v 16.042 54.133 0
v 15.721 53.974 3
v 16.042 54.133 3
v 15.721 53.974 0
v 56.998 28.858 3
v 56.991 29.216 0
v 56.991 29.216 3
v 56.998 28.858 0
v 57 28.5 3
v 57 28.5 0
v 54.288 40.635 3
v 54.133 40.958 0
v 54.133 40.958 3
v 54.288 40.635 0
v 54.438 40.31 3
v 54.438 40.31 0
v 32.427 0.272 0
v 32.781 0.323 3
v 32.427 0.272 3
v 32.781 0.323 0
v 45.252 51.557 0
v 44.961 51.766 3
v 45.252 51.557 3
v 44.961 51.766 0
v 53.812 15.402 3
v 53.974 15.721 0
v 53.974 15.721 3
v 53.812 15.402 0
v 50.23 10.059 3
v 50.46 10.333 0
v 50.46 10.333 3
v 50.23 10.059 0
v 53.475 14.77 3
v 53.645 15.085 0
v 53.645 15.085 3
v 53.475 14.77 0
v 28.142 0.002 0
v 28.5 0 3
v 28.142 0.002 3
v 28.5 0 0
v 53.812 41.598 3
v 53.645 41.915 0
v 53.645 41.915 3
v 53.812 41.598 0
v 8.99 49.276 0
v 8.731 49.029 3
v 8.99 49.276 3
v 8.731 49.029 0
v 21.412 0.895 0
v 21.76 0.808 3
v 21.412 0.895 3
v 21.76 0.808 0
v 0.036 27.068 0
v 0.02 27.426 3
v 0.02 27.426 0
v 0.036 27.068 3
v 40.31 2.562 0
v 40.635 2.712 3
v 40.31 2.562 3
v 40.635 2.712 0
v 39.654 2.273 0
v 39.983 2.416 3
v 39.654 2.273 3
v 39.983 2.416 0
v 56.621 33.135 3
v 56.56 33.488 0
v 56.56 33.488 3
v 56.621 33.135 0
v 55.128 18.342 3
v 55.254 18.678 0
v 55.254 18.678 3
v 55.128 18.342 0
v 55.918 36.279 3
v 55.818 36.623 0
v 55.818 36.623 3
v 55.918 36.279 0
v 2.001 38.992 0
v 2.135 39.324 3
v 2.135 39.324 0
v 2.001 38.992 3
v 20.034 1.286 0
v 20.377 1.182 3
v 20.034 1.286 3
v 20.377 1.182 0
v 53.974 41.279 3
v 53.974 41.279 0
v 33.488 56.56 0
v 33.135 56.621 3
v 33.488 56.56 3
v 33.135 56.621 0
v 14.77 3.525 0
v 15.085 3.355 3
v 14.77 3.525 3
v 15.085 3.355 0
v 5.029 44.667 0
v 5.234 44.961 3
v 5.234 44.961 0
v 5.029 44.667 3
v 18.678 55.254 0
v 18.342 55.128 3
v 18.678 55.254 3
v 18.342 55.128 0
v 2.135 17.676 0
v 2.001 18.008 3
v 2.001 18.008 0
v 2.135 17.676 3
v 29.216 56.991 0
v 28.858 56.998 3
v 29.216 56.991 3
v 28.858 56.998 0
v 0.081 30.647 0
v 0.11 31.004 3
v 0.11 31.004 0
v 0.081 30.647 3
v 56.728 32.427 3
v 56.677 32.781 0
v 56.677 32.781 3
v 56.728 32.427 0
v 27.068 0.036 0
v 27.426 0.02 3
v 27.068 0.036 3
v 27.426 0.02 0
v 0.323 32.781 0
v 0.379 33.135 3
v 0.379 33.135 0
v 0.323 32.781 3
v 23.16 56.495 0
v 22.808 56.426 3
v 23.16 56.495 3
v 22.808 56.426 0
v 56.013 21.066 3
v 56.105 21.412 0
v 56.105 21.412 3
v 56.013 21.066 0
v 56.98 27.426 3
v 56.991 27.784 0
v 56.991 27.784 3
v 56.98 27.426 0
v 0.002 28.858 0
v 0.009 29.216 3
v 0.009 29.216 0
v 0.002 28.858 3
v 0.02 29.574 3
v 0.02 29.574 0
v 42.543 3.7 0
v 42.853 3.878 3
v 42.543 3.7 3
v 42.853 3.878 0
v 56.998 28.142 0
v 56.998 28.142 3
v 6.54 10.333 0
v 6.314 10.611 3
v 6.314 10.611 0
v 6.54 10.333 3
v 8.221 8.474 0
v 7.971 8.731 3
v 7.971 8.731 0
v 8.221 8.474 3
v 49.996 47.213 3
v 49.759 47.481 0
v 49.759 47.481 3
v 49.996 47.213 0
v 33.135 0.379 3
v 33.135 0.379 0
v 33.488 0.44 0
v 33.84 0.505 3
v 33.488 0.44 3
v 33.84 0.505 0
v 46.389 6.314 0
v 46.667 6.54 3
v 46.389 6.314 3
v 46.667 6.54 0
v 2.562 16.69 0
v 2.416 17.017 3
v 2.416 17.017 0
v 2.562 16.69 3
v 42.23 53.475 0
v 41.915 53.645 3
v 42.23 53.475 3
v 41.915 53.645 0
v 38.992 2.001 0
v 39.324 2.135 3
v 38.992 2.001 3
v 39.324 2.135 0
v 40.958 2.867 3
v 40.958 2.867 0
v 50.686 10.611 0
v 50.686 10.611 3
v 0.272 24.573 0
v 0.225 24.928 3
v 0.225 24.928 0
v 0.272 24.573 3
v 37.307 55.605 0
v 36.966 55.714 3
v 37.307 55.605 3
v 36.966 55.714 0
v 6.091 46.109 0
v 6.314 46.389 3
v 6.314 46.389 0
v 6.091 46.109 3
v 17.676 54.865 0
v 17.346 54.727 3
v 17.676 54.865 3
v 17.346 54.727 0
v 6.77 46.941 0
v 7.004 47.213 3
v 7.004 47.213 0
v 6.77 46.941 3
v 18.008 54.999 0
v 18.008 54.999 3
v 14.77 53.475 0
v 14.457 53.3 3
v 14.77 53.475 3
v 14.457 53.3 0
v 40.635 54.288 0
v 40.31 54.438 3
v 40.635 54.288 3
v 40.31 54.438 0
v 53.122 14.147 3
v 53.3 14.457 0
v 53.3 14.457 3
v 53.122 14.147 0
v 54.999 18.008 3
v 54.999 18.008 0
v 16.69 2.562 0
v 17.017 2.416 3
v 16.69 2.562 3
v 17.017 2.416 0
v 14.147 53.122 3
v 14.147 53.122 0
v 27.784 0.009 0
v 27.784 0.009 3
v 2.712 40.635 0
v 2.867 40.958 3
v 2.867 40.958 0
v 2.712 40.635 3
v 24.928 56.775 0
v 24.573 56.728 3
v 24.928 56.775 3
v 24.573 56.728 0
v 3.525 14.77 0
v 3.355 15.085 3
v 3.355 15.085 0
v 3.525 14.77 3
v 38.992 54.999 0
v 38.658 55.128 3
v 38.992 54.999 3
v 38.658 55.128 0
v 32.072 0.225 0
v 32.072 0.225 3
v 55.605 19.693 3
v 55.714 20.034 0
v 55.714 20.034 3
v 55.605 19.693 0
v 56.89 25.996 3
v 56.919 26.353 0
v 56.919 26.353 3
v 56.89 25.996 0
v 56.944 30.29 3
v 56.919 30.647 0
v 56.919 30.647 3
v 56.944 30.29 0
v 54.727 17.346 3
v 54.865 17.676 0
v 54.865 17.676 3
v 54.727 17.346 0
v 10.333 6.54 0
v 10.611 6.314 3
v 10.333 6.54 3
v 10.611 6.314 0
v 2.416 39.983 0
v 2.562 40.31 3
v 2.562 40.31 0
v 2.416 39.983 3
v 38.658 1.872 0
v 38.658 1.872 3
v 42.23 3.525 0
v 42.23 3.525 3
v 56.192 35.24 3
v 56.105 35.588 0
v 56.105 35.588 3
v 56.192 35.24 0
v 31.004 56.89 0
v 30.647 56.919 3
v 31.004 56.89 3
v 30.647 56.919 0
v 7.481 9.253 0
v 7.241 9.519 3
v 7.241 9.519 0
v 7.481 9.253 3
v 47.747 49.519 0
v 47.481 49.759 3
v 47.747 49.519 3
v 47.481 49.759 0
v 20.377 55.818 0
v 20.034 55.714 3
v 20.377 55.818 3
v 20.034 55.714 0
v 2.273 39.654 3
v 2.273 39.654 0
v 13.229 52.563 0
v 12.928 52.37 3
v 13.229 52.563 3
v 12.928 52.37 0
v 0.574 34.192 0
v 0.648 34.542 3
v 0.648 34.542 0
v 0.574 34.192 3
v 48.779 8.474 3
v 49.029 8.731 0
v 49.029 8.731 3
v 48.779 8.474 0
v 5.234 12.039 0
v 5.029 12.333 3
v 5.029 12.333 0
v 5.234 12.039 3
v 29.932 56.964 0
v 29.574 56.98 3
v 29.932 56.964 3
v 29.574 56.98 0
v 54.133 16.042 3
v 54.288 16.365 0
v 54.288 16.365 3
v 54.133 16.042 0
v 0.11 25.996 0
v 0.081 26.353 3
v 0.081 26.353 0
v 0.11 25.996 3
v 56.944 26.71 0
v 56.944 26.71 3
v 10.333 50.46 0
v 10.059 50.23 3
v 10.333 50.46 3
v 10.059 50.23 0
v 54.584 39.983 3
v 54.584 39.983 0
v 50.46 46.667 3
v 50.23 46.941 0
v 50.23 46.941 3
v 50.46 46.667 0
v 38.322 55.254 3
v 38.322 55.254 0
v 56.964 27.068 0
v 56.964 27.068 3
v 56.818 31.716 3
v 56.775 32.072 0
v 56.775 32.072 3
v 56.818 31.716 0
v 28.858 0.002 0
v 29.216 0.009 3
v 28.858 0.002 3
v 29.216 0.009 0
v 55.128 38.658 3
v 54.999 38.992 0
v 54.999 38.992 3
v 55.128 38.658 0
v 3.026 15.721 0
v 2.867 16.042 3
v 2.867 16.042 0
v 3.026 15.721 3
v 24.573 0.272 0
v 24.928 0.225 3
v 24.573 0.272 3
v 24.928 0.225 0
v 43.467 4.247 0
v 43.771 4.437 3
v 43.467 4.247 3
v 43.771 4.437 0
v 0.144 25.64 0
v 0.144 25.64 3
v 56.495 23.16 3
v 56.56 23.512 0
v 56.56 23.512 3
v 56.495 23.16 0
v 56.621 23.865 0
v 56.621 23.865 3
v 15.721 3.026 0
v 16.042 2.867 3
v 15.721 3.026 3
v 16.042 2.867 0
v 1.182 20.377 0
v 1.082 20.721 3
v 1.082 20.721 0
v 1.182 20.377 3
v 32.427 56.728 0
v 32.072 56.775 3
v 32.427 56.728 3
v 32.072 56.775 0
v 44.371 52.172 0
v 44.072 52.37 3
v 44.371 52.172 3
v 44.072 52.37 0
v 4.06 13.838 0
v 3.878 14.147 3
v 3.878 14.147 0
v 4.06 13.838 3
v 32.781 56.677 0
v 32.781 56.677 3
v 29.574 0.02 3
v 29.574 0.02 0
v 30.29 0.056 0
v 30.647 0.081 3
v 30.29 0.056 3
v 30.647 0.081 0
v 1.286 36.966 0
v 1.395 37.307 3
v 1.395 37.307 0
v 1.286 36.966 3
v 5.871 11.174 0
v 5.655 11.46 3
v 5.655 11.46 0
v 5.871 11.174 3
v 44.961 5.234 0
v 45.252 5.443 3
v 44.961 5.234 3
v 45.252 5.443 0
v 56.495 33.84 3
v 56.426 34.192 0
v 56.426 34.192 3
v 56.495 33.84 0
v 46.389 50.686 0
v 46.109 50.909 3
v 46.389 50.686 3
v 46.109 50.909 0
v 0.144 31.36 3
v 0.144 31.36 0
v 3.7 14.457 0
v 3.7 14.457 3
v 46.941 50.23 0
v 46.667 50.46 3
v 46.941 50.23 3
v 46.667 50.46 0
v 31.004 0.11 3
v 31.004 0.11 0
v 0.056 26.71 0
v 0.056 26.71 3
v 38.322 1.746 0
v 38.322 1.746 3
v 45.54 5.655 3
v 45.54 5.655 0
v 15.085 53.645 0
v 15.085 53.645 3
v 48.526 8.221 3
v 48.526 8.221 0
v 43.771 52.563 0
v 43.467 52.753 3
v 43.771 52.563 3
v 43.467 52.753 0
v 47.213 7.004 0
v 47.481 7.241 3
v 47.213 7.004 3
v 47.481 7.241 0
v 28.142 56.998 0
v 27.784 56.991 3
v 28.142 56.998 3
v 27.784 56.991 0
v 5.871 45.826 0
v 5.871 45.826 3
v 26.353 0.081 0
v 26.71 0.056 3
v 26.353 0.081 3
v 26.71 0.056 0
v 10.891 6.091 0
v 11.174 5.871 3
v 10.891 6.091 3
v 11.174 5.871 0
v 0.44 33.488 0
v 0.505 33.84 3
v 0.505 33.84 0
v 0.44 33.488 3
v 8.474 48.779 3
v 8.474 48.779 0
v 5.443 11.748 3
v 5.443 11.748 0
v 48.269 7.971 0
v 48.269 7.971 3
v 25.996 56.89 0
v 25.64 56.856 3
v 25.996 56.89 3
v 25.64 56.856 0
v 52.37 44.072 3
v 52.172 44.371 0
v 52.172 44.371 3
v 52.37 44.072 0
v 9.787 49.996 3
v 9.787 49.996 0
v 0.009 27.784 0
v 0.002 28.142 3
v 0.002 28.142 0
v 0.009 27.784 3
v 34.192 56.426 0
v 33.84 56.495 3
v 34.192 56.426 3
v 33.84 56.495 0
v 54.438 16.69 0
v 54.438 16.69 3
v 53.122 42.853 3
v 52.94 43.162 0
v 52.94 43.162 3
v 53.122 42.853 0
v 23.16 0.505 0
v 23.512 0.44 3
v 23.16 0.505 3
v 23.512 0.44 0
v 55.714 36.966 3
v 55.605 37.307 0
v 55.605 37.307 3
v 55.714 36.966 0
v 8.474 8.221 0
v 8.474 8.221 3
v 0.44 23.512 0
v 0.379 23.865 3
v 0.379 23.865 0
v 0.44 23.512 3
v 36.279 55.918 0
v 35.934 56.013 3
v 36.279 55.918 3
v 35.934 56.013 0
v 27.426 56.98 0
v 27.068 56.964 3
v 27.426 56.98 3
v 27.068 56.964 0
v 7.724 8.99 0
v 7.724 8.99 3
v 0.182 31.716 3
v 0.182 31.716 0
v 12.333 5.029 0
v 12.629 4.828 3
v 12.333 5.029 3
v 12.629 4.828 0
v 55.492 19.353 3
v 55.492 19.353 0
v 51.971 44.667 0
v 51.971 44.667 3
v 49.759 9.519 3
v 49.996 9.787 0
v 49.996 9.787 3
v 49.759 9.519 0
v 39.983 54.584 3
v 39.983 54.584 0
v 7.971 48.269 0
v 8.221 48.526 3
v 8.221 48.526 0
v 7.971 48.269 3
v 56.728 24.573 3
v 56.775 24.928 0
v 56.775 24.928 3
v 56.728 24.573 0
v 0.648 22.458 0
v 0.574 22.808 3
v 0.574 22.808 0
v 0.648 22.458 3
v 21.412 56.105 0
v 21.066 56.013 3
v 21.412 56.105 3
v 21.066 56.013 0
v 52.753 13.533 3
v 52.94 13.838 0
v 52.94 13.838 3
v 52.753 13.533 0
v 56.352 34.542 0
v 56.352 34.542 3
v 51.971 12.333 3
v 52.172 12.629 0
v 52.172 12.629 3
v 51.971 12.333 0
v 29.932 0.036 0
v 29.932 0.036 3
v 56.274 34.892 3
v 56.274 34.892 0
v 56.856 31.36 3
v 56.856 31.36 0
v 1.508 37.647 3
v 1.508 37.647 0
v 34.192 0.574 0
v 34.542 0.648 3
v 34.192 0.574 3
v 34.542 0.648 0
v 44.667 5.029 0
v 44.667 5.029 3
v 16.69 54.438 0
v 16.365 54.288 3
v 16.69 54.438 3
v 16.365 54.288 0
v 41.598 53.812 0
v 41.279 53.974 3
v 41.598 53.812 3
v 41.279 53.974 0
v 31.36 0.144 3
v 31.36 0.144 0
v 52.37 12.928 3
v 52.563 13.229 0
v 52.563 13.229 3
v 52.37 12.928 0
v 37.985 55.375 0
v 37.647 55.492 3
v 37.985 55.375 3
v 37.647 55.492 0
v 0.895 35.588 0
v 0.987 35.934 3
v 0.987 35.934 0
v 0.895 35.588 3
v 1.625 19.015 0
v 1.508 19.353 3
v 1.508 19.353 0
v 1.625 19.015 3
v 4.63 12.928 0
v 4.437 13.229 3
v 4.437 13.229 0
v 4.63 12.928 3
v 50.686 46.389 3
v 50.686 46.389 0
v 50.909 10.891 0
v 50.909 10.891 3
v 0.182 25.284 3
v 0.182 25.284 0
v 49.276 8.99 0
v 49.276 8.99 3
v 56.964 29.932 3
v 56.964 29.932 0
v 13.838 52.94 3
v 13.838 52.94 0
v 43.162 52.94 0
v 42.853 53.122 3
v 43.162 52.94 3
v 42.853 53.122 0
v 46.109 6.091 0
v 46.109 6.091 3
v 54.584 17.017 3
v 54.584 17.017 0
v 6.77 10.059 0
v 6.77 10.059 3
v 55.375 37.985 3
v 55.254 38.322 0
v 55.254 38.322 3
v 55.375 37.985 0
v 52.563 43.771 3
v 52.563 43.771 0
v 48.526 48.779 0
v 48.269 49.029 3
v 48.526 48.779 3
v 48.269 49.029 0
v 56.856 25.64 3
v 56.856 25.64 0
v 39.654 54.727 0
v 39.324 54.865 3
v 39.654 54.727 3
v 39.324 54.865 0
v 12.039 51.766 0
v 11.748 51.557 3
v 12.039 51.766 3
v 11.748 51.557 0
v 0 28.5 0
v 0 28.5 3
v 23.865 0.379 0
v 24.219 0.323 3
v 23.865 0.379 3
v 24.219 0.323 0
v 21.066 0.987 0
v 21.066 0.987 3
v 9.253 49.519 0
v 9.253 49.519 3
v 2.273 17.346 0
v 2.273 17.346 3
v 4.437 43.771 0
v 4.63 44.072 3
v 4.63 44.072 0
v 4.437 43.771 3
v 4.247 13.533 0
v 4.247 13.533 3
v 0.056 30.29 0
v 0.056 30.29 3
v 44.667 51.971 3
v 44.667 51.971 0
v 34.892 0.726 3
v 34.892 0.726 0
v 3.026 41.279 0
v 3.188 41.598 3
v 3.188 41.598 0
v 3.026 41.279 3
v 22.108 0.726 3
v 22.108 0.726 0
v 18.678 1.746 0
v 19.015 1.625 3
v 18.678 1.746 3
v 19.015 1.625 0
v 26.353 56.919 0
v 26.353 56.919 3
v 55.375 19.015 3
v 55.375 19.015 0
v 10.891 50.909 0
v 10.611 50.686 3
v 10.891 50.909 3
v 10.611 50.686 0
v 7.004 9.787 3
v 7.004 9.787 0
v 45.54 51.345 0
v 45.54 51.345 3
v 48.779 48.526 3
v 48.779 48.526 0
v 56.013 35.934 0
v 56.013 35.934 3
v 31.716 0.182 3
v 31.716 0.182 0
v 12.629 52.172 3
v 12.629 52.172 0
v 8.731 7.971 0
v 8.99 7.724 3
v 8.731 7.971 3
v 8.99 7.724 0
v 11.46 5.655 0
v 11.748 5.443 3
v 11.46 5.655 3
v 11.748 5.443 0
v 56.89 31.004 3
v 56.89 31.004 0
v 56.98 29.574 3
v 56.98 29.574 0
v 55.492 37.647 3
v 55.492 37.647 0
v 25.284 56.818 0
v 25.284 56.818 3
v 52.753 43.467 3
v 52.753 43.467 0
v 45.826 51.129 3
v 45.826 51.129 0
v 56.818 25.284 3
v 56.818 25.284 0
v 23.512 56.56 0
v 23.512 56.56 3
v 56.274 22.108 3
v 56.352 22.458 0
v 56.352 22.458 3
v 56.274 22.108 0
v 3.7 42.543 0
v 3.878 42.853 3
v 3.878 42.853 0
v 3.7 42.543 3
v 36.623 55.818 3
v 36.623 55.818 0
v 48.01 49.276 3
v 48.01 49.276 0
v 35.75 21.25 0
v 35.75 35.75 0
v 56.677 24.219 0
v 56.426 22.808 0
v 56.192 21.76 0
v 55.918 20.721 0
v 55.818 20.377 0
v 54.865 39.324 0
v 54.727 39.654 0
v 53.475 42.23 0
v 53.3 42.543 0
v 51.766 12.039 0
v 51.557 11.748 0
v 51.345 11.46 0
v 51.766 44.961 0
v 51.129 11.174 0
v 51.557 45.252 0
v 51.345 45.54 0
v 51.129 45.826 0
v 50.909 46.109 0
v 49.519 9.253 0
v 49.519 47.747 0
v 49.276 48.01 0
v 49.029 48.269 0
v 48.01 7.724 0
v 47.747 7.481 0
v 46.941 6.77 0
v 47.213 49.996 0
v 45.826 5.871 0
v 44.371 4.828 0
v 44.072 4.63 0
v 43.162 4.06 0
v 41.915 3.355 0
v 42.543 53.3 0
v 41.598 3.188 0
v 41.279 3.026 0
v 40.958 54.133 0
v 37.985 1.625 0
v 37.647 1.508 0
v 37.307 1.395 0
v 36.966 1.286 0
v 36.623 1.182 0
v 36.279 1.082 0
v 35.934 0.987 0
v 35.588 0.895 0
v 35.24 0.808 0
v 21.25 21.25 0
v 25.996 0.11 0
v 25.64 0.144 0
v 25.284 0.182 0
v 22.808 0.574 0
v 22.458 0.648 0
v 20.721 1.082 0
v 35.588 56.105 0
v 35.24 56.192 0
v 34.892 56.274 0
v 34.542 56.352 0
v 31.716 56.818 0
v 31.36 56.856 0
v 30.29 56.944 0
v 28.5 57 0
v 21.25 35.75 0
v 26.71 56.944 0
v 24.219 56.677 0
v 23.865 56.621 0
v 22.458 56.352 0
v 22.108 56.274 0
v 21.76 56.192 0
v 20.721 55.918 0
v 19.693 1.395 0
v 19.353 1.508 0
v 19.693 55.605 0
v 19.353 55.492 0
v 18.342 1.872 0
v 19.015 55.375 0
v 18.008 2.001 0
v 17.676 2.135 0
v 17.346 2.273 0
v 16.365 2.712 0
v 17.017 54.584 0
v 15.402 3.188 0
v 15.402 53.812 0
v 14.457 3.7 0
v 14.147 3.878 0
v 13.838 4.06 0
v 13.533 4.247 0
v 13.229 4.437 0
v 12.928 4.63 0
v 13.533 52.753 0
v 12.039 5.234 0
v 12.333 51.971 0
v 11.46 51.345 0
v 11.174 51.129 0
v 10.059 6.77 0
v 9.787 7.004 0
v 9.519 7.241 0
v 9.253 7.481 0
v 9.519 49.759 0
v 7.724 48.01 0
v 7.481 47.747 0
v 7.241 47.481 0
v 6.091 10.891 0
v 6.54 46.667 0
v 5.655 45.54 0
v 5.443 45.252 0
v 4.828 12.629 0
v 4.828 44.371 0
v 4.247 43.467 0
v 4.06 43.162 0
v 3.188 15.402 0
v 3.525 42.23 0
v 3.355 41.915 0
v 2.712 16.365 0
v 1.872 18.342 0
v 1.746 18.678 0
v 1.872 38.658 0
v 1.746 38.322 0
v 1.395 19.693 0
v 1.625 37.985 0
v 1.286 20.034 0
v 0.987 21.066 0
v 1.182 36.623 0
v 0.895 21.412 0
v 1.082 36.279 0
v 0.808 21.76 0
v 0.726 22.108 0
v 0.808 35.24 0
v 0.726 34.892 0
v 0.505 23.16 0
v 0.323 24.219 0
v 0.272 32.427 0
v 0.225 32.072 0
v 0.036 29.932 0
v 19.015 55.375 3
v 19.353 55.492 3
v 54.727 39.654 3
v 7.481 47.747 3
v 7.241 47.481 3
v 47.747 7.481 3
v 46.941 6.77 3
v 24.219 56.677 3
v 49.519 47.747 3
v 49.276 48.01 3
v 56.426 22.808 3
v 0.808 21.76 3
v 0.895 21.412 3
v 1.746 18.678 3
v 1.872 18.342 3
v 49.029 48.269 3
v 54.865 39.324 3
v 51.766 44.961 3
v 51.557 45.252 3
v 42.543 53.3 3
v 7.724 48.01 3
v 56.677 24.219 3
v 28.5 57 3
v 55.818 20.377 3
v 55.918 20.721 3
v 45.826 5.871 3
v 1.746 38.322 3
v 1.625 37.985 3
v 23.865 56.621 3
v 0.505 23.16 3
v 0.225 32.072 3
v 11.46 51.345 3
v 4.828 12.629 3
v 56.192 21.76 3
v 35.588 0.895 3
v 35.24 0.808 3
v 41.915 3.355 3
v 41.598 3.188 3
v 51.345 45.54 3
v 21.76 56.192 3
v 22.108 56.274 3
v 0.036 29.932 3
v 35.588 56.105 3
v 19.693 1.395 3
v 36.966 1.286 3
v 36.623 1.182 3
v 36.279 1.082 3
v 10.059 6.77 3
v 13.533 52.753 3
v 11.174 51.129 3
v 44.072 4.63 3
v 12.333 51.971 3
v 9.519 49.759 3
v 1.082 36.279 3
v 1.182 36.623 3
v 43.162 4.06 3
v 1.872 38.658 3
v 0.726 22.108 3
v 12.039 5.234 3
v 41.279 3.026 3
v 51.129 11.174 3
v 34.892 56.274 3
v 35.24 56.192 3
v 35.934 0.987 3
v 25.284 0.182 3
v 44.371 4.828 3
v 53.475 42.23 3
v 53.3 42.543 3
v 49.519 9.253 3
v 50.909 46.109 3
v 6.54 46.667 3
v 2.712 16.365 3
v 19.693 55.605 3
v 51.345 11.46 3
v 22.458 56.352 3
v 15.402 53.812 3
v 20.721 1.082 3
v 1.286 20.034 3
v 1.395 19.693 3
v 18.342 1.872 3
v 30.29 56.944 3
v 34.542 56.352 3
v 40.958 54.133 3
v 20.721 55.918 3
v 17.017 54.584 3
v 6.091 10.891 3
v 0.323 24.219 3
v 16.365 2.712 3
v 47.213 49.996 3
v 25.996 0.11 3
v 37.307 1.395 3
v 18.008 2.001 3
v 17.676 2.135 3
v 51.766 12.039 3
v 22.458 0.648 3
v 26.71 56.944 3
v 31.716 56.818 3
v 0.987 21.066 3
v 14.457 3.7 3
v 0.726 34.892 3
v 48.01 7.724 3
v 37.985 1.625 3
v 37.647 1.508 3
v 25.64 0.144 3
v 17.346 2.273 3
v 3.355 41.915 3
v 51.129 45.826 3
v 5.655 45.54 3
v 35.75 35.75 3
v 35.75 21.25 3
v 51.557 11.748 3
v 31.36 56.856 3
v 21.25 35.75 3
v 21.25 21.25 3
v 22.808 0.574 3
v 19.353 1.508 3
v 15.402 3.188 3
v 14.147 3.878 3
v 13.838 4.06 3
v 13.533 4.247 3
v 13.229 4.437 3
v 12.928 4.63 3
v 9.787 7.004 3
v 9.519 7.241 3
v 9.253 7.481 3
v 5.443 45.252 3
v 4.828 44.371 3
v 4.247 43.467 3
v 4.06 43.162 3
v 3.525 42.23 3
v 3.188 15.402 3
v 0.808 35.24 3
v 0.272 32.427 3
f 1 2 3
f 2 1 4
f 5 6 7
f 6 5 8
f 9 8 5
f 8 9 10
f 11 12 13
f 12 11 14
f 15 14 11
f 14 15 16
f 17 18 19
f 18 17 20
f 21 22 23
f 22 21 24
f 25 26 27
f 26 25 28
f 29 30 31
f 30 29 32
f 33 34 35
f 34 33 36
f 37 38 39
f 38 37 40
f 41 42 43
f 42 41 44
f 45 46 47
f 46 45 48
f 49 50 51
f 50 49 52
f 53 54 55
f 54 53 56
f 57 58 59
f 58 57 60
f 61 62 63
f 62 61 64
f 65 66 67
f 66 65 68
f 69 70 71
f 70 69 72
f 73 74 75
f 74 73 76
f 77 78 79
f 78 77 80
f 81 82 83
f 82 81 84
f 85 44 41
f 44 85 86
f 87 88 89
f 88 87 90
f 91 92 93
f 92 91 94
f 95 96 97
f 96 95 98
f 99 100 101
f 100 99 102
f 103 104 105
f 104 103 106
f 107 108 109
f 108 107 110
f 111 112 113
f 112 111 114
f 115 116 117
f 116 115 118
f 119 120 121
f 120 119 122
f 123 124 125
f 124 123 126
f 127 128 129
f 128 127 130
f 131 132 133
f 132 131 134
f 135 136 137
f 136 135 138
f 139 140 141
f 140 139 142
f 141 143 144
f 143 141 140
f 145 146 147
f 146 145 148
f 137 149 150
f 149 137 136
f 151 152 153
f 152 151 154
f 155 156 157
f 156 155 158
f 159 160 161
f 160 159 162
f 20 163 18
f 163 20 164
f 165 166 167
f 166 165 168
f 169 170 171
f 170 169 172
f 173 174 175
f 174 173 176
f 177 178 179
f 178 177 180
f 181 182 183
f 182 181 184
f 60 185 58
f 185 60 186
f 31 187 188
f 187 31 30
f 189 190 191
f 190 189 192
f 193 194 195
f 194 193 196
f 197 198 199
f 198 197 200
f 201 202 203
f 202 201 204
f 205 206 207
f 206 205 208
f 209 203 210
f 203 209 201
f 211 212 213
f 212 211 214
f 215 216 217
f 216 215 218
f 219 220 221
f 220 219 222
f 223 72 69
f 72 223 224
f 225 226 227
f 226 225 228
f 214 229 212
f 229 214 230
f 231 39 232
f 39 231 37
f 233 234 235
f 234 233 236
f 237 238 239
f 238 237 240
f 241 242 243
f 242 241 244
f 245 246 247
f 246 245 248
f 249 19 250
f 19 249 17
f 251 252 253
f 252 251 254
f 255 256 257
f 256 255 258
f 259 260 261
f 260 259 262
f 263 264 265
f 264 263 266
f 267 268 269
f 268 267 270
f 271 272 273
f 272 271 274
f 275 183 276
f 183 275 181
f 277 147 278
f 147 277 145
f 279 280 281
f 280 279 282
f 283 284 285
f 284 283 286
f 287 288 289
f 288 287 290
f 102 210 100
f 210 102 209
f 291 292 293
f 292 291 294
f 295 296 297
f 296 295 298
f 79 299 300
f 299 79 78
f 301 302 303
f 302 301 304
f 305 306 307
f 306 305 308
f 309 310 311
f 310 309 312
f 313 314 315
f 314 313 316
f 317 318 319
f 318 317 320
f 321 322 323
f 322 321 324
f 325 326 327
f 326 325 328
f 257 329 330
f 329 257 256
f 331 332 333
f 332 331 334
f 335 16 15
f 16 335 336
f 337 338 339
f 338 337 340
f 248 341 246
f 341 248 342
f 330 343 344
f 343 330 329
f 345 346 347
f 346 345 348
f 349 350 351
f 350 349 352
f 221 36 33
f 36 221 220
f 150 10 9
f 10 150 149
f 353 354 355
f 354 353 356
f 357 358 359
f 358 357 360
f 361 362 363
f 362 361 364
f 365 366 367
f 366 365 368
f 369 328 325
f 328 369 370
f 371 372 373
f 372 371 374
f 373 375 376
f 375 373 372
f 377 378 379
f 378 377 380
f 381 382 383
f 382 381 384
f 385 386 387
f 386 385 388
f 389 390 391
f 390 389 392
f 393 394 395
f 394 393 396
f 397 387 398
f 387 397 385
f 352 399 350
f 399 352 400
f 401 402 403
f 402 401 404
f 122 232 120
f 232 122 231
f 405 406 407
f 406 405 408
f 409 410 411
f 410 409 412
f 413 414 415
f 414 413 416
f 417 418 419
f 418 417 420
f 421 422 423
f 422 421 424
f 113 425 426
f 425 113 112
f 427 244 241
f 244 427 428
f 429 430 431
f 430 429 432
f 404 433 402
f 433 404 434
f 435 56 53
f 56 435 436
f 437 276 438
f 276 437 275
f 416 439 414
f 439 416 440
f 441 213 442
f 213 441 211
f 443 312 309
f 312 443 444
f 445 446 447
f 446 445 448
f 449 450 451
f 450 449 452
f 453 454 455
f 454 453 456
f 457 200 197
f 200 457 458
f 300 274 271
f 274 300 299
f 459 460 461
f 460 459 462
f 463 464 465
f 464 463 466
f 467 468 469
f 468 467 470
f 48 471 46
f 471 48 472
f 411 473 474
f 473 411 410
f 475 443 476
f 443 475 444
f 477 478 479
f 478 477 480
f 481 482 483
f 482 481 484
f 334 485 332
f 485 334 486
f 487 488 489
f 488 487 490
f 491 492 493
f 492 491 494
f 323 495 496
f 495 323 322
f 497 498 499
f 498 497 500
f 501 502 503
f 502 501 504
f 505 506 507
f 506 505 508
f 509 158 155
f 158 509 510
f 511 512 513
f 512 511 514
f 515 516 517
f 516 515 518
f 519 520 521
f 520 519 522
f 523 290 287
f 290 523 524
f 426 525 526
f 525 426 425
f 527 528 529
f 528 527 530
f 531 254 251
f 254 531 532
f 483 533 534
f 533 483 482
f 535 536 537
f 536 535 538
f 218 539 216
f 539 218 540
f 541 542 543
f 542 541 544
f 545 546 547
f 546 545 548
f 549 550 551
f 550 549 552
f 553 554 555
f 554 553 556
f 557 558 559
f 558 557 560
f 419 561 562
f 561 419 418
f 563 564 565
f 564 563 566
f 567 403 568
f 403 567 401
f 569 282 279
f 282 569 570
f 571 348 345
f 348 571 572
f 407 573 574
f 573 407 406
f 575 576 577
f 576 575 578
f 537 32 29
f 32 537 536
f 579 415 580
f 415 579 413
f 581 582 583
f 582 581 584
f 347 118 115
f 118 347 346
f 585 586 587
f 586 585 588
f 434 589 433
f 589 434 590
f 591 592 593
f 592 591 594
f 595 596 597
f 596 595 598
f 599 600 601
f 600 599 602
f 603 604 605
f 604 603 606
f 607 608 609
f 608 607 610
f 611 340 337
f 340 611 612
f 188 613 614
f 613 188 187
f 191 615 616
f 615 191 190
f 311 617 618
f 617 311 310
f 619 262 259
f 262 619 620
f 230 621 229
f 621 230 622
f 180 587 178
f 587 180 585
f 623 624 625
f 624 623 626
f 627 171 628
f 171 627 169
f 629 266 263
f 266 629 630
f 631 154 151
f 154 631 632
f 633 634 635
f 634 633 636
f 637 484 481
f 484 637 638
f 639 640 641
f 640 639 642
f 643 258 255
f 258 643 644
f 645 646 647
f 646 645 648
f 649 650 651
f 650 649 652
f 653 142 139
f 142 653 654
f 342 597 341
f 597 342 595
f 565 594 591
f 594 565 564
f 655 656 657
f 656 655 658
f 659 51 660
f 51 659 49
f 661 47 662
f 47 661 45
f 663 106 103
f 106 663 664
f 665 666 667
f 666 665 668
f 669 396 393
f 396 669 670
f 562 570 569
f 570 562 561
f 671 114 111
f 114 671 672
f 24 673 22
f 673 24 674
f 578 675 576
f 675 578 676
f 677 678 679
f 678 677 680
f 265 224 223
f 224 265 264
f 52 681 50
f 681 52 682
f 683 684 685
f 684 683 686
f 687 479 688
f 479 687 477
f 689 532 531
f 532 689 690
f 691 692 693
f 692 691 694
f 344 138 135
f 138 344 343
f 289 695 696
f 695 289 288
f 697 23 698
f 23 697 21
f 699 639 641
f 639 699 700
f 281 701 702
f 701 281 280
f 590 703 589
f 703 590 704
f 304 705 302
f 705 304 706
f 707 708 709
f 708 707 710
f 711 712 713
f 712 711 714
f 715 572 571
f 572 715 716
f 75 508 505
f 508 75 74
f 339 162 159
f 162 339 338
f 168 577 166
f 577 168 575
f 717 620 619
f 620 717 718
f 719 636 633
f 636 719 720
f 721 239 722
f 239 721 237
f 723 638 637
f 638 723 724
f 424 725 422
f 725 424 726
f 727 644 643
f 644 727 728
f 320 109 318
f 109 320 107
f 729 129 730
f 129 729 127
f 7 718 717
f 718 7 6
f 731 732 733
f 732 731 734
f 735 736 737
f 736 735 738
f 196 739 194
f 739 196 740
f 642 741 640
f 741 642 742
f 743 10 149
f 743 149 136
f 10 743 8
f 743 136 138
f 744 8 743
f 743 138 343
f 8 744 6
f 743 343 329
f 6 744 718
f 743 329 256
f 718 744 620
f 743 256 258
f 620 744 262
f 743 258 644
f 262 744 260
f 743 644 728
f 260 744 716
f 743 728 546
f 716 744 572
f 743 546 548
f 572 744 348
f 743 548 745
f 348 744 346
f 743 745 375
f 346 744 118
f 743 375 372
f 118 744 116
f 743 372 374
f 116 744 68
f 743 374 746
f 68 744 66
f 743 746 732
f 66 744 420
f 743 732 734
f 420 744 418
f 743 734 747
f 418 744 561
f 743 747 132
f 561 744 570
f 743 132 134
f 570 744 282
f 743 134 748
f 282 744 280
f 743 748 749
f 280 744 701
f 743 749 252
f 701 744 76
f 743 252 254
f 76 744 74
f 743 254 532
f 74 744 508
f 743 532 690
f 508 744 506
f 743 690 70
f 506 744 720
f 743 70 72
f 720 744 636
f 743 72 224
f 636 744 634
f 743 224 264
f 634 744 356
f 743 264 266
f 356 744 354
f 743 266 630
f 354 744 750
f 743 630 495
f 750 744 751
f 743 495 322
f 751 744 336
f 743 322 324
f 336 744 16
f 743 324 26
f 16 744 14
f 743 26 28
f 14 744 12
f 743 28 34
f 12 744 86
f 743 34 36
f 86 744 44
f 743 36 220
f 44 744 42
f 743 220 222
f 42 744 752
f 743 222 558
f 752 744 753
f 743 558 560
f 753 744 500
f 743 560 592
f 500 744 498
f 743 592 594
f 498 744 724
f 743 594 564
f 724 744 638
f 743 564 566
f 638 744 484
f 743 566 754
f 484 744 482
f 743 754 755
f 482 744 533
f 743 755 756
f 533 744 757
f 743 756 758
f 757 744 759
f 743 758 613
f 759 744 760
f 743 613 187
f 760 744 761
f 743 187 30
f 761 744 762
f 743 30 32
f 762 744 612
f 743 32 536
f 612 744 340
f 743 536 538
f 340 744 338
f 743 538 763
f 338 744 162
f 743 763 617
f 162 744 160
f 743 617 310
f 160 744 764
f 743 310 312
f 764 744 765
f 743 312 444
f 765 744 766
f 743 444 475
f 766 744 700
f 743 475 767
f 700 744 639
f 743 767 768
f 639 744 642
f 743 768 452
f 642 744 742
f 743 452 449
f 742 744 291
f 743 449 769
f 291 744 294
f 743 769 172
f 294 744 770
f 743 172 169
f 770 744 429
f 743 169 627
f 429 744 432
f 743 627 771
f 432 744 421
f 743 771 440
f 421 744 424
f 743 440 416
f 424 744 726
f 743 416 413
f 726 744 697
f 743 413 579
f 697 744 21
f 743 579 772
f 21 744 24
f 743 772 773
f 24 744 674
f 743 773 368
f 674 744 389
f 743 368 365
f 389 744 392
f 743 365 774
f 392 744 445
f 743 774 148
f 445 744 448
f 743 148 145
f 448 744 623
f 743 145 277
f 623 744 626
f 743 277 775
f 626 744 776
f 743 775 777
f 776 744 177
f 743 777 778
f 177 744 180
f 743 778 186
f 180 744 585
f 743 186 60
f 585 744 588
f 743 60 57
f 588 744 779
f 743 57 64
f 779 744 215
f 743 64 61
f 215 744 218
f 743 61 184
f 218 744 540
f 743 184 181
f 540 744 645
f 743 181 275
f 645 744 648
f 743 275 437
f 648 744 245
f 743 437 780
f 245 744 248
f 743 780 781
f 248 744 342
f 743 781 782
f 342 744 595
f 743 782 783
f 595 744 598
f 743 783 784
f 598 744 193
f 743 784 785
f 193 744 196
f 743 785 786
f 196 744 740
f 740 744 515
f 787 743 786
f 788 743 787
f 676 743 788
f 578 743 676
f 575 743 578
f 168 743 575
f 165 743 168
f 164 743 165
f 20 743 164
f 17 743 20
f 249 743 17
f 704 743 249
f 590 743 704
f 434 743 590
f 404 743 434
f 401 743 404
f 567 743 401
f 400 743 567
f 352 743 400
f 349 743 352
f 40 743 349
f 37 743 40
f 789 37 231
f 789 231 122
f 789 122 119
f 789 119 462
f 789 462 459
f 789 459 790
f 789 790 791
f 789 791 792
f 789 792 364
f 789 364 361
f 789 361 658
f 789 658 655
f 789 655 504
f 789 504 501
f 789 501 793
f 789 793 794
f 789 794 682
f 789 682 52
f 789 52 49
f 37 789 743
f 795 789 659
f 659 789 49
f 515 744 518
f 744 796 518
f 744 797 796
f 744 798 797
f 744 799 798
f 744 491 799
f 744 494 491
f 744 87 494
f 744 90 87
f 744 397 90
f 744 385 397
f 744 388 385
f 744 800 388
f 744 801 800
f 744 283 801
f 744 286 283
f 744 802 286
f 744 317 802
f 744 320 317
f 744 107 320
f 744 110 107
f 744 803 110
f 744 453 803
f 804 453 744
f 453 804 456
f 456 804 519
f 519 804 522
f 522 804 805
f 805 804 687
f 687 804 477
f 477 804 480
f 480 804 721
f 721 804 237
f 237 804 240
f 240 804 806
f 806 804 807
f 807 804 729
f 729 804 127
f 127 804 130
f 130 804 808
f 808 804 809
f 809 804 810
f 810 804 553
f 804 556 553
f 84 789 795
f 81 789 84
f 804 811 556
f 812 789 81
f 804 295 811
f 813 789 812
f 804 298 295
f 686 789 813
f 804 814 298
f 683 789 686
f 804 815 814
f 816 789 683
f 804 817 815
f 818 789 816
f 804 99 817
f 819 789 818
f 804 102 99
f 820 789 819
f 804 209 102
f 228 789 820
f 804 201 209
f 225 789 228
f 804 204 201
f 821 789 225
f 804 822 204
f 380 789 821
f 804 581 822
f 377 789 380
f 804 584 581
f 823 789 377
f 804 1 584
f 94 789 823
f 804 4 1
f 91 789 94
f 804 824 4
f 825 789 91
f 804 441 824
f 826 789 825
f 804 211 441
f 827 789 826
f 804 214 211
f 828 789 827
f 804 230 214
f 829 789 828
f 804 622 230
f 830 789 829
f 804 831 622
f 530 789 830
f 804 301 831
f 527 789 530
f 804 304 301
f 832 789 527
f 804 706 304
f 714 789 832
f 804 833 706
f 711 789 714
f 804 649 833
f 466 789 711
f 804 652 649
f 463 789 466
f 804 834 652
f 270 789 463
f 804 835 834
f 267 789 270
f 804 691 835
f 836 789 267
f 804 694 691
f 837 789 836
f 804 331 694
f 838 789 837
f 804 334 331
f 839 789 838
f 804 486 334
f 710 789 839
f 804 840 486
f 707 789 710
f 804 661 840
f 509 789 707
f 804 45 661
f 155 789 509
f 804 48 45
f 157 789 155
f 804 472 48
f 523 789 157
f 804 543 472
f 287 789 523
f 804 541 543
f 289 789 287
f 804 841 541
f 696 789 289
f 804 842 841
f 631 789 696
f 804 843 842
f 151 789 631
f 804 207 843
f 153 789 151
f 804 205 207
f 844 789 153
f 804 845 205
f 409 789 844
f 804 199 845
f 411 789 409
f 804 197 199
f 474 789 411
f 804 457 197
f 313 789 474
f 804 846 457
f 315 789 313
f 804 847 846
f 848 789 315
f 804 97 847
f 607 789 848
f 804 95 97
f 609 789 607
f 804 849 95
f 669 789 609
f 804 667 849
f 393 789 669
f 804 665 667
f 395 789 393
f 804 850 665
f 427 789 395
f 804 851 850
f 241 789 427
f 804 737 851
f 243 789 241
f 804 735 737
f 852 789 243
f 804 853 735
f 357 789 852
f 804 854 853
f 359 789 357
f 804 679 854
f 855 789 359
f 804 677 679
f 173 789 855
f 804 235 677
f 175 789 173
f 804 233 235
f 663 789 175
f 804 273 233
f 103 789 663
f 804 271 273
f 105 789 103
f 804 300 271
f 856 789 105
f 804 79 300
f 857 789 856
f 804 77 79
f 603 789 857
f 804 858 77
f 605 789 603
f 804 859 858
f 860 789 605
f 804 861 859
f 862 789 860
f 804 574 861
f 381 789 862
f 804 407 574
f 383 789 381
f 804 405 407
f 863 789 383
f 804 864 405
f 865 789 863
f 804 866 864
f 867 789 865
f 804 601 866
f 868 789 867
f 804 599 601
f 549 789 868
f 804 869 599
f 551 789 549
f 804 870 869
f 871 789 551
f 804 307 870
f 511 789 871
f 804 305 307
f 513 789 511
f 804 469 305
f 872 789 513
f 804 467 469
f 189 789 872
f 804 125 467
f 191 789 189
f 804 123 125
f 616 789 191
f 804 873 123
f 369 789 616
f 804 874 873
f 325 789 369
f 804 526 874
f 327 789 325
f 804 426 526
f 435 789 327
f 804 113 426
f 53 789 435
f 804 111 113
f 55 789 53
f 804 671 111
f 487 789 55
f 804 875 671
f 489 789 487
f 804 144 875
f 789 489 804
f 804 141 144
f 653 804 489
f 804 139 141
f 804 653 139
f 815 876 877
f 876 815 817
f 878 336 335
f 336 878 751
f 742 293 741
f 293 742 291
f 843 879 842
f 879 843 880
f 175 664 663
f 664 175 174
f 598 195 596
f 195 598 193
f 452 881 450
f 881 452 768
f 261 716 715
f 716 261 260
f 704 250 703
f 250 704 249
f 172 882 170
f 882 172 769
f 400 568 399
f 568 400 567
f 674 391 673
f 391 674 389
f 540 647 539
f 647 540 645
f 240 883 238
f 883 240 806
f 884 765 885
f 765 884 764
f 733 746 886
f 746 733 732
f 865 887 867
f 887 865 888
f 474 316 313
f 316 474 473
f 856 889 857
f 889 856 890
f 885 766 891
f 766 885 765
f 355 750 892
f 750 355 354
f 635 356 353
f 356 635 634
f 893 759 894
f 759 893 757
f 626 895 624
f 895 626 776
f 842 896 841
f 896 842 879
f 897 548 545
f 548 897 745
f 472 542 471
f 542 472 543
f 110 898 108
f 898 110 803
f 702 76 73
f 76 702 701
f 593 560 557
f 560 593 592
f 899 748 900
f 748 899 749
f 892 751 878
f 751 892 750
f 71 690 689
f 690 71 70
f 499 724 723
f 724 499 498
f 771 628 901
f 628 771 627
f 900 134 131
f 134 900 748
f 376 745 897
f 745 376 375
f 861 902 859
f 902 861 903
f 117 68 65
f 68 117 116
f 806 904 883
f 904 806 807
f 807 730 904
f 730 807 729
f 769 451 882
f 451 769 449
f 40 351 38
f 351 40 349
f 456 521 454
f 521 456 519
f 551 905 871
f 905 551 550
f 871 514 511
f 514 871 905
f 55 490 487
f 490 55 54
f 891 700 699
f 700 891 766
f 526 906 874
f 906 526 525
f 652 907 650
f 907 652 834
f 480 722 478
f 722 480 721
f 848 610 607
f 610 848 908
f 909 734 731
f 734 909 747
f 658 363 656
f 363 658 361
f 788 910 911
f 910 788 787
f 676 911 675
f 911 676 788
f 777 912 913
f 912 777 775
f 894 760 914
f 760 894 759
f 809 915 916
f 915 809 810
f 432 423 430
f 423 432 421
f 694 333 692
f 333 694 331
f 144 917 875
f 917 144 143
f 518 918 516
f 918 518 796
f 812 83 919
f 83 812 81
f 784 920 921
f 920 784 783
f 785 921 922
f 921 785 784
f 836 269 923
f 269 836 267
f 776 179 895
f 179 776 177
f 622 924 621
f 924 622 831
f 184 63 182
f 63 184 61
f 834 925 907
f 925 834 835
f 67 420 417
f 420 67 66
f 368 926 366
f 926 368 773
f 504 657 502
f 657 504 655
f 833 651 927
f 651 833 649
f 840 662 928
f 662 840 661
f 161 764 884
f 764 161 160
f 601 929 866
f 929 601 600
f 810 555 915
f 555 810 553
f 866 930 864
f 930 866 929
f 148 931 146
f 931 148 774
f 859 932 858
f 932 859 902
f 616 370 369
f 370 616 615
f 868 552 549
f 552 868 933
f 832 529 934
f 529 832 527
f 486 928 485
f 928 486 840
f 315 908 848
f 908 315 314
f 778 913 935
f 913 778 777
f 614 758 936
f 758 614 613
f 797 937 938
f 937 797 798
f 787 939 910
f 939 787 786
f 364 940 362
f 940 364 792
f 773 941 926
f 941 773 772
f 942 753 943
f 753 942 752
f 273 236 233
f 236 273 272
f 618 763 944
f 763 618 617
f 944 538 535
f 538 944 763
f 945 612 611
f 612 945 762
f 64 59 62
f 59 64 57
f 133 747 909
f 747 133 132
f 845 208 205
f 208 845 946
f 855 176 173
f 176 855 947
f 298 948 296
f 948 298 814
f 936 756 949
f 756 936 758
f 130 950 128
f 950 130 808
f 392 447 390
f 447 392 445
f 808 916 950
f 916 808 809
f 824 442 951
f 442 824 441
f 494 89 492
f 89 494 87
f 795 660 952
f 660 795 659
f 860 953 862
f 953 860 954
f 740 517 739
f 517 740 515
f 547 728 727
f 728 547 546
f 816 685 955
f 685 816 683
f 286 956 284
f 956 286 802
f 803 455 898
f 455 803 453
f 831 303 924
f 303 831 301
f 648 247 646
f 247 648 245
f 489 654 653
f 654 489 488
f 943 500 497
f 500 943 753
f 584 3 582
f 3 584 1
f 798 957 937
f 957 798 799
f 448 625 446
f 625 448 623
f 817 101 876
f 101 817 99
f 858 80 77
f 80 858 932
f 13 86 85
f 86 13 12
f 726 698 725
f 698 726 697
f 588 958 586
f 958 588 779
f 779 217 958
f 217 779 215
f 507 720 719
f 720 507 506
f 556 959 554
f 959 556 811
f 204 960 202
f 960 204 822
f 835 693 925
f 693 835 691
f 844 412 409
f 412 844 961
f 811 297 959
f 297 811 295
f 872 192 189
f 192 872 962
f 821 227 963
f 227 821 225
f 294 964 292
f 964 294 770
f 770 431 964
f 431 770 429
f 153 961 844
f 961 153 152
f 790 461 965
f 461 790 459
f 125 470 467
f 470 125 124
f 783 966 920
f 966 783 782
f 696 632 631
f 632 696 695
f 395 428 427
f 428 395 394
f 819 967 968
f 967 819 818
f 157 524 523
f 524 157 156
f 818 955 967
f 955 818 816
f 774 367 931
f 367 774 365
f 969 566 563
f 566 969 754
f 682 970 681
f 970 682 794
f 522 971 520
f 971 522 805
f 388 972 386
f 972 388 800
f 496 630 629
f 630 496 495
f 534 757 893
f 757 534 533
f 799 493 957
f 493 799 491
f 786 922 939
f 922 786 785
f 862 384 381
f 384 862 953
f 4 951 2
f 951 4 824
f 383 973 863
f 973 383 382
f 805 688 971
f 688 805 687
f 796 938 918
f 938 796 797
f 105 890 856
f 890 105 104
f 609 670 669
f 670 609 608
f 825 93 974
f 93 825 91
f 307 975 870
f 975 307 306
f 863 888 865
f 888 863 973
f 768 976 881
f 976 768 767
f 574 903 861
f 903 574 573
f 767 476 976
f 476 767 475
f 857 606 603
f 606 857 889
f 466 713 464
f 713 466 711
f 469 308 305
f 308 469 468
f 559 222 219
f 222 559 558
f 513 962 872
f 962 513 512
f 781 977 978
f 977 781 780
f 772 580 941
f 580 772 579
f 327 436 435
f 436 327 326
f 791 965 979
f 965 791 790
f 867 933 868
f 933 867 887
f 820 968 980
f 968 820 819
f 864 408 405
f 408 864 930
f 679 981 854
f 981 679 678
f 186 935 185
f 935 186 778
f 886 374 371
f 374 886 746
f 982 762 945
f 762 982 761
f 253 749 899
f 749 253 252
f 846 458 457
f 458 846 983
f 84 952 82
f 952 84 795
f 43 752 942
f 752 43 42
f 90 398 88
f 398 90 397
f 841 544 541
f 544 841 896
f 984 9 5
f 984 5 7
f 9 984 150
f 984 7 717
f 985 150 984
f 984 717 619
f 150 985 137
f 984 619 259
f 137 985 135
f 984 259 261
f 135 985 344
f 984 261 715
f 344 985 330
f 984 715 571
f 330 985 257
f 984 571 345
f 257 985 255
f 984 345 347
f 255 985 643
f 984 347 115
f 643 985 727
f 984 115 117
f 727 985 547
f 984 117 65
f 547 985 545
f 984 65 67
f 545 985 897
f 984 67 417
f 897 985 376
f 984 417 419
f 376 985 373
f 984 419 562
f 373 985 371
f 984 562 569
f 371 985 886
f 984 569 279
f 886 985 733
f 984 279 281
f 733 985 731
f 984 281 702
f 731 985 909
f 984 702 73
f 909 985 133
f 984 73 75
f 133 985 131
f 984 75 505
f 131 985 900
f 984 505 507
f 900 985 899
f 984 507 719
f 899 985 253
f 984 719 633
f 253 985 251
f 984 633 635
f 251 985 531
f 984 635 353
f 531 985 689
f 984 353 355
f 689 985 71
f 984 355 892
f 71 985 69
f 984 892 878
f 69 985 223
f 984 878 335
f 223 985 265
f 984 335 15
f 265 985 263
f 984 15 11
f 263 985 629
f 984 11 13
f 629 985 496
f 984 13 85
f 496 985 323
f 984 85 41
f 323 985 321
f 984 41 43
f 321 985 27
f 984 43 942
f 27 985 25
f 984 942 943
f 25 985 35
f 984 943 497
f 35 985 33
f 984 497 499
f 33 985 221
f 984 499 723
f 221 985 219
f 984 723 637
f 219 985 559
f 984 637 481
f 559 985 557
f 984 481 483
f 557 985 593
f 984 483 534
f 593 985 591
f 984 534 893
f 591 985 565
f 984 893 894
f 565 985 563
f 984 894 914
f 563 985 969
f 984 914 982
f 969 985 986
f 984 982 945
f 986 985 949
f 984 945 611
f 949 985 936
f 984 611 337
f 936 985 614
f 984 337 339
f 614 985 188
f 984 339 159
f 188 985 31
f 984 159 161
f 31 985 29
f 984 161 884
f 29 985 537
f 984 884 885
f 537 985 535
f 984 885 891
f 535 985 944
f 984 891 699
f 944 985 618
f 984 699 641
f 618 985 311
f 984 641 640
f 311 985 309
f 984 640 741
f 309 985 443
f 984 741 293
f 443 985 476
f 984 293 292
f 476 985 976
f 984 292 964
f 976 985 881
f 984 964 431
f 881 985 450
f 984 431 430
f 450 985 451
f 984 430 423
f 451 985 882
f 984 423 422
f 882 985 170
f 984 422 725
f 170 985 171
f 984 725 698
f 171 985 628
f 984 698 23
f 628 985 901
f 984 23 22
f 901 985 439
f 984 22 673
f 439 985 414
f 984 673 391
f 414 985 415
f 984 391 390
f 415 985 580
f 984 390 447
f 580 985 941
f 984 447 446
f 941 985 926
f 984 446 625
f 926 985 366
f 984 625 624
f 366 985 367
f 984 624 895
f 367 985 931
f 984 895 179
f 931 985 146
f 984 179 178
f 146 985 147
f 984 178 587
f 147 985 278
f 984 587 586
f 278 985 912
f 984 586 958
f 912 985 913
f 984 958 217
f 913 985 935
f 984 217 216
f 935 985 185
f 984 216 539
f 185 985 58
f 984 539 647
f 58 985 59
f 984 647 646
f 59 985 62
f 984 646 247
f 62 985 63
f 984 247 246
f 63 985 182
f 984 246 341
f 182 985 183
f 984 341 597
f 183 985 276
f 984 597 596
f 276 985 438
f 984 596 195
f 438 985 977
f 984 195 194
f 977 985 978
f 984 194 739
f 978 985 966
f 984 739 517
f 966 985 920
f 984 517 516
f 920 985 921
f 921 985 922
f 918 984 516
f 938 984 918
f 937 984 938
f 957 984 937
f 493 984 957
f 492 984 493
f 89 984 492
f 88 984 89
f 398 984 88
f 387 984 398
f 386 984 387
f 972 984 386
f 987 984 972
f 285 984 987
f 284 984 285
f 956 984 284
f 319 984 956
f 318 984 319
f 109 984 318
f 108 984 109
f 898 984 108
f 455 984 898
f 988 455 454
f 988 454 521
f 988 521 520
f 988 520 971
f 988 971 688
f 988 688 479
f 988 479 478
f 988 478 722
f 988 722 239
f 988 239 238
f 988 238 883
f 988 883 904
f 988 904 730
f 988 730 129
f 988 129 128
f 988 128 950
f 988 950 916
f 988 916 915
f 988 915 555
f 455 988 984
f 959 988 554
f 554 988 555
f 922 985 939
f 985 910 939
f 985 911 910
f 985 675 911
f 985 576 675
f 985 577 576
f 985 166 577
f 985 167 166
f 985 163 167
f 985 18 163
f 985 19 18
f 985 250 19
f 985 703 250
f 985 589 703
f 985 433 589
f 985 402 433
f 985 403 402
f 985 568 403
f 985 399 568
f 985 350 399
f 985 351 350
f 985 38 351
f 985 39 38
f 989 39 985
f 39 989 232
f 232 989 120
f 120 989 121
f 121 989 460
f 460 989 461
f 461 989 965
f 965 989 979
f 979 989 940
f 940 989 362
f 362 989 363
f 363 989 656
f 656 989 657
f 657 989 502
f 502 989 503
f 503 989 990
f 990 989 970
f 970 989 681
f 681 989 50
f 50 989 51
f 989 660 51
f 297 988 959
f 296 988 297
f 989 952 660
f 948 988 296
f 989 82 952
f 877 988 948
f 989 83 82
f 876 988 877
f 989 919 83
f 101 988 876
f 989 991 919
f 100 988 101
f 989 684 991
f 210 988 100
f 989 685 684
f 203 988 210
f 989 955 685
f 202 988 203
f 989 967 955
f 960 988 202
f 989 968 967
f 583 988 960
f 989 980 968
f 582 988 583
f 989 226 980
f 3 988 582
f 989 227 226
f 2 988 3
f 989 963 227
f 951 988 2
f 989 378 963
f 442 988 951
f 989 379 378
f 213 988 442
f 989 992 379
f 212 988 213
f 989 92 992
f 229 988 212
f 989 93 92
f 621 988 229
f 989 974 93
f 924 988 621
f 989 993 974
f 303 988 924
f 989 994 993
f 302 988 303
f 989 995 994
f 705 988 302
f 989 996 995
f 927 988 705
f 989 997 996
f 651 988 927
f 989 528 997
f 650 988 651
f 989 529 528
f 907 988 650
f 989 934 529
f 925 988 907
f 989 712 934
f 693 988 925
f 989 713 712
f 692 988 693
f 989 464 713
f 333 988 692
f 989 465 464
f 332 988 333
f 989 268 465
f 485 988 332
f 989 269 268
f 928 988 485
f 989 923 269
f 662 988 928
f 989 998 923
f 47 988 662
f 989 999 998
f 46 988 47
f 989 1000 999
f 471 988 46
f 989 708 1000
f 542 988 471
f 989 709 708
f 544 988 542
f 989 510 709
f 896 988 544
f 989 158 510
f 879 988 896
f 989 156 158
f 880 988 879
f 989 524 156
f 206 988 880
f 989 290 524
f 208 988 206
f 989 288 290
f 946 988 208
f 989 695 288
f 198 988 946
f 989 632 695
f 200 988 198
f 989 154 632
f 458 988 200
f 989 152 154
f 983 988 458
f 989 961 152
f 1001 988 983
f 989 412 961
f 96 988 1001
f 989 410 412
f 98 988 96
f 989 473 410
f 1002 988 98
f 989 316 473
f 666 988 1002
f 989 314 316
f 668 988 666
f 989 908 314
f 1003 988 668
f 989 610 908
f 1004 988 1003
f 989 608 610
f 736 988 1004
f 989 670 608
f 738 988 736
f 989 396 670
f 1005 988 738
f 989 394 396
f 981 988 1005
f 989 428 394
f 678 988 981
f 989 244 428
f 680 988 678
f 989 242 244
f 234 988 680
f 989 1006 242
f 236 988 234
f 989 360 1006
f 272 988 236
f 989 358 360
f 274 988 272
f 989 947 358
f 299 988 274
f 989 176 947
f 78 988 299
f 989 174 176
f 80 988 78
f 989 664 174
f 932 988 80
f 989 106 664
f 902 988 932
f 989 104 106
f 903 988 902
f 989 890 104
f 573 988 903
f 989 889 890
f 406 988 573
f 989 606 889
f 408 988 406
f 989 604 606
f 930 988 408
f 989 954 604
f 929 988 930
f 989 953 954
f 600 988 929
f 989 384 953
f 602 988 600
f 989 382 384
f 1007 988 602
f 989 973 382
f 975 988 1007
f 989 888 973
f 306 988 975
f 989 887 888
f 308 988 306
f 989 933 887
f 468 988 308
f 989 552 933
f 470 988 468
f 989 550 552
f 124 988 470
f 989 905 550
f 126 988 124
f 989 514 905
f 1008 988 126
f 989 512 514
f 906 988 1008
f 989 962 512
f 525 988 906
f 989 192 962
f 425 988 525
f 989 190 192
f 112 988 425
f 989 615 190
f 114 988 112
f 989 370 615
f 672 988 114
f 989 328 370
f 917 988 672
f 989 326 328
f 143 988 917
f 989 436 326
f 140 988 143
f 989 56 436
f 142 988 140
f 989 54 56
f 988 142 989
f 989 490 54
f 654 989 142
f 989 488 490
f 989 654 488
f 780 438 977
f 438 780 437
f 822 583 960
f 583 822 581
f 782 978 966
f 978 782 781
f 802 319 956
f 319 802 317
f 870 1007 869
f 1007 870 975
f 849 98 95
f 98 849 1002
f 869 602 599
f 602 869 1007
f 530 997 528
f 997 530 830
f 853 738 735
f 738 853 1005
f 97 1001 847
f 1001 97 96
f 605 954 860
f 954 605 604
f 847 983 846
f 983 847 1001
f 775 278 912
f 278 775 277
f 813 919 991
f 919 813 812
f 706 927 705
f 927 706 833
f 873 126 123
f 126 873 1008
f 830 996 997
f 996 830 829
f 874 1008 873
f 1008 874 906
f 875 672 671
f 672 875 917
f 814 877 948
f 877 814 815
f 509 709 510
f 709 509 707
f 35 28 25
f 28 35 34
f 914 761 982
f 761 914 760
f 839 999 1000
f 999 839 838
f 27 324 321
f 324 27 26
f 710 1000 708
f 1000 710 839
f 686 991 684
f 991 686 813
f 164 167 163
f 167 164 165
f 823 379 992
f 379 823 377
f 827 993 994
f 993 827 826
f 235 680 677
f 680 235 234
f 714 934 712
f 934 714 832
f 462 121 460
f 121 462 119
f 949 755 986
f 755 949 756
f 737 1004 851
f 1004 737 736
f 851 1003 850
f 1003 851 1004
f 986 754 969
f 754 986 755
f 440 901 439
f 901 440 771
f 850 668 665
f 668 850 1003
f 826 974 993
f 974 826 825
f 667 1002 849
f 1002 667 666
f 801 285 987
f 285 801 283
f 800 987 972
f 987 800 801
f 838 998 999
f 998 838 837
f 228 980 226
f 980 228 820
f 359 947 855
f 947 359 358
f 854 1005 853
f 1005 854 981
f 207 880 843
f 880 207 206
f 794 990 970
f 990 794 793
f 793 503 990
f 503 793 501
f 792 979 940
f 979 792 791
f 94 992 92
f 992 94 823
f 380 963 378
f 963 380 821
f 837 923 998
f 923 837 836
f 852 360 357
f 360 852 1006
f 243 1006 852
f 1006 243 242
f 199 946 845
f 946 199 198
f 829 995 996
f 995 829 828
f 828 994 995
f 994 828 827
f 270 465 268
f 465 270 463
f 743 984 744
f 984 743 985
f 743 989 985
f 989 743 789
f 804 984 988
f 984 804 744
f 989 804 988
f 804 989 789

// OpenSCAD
$fn=500;
width=17;
outerWidth=57;
wallWidth=2;
tabWidth=2;
hd=0.5; // holder distance

module centerCube()
{
	hull()
	{
		translate([2.25,2.25,18]) cube([10,10,1]);
		cube([14.5,14.5,5]);
	}
	
}


module mainCube()
{
	diff = outerWidth - width;
	offset = diff/2;
	innerWidth = width - (wallWidth*2);
	
	difference()
	{
		union()
		{
			translate([outerWidth/2,outerWidth/2,0]) cylinder(d=outerWidth,3);
		}
		
		
		translate([offset+1.25,offset+1.25,0]) centerCube();
		
	}
	
}

mainCube();
